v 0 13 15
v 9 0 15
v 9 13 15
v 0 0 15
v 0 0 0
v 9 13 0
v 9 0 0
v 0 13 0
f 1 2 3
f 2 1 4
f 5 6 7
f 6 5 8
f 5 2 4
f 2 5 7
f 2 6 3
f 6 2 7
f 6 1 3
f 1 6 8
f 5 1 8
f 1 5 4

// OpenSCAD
// Generated by SolidPython 1.0.1 on 2020-07-29 00:46:55


cube(size = [9, 13, 15]);
/***********************************************
*********      SolidPython code:      **********
************************************************
 
# import packages: SolidPython
from solid import *
from solid.utils import *
from itertools import chain, combinations, permutations


class Resize:

    def __init__(self, scad_file):
        self.scad_file = scad_file
        #self.scad_file = import_scad(scad_file)
        # cone/cylinder param:
        self.r1 = 0
        self.r2 = 0
        self.h = 0
        # rectangular prism param:
        self.w = 0
        self.l = 0
        # ellipse param:
        self.r = 0

    # import OpenScad code (file name corresponds to shape)


    # classify shape + parameters
    def assign(self, param1, param2, param3):
        if self.scad_file == 'cone.scad':
            self.r1 = param1
            self.r2 = param2
            self.h = param3
        elif self.scad_file == 'cylinder.scad':
            self.r1 = param1
            self.r2 = param2
            self.h = param3
        elif self.scad_file == 'rectangularPrism.scad':
            self.h = param1
            self.l = param2
            self.w = param3
        else:
            self.r = param1
            self.h = param2

    # resize parameters
    def iterate(self):
        x = range(3, 20, 2)
        i = 1
        if self.scad_file == 'cone.scad':
            tempList = list(permutations(x, 2))
            for temp in tempList:
                param1 = temp[0]
                param2 = temp[1]
                filepath = 'produced_scad_files/' + 'cone' + str(param1) + '_' + str(param2) + '_' + '.scad'
                scad_render_to_file(cylinder(h=param1, r1=param2, r2=0), filepath)

        elif self.scad_file == 'cylinder.scad':
            tempList = list(permutations(x, 3))
            for temp in tempList:
                param1 = temp[0]
                param2 = temp[1]
                filepath = 'produced_scad_files/' + 'cylinder' + str(param1) + '_' + str(param2) + '_' + '.scad'
                scad_render_to_file(cylinder(h=param1, r1=param2, r2=param2), filepath)

        elif self.scad_file == 'rectangularPrism.scad':
            tempList = list(permutations(x, 3))
            for temp in tempList:
                param1 = temp[0]
                param2 = temp[1]
                param3 = temp[2]
                filepath = 'produced_scad_files/' + 'rectangularPrism' + str(param1) + '_' + str(param2) + '_' + str(
                    param3) + '.scad'
                scad_render_to_file(cube(size=(param1, param2, param3)), filepath)

        elif self.scad_file == 'ellipse.scad':
            tempList = list(permutations(x, 4))
            for temp in tempList:
                param1 = temp[0]
                param2 = temp[1]
                param3 = temp[2]
                param4 = temp[3]
                filepath = 'produced_scad_files/' + 'ellipse' + str(param1) + '_' + str(param2) + '_' + str(param3) + '_' + str(param4) + '.scad'
                scad_render_to_file(scale([param1, param2, param3])(sphere(r=param4)), filepath)

    def render_to_scadfile(self):
        scad_render_to_file(scad, 'example.scad') 
 
************************************************/
